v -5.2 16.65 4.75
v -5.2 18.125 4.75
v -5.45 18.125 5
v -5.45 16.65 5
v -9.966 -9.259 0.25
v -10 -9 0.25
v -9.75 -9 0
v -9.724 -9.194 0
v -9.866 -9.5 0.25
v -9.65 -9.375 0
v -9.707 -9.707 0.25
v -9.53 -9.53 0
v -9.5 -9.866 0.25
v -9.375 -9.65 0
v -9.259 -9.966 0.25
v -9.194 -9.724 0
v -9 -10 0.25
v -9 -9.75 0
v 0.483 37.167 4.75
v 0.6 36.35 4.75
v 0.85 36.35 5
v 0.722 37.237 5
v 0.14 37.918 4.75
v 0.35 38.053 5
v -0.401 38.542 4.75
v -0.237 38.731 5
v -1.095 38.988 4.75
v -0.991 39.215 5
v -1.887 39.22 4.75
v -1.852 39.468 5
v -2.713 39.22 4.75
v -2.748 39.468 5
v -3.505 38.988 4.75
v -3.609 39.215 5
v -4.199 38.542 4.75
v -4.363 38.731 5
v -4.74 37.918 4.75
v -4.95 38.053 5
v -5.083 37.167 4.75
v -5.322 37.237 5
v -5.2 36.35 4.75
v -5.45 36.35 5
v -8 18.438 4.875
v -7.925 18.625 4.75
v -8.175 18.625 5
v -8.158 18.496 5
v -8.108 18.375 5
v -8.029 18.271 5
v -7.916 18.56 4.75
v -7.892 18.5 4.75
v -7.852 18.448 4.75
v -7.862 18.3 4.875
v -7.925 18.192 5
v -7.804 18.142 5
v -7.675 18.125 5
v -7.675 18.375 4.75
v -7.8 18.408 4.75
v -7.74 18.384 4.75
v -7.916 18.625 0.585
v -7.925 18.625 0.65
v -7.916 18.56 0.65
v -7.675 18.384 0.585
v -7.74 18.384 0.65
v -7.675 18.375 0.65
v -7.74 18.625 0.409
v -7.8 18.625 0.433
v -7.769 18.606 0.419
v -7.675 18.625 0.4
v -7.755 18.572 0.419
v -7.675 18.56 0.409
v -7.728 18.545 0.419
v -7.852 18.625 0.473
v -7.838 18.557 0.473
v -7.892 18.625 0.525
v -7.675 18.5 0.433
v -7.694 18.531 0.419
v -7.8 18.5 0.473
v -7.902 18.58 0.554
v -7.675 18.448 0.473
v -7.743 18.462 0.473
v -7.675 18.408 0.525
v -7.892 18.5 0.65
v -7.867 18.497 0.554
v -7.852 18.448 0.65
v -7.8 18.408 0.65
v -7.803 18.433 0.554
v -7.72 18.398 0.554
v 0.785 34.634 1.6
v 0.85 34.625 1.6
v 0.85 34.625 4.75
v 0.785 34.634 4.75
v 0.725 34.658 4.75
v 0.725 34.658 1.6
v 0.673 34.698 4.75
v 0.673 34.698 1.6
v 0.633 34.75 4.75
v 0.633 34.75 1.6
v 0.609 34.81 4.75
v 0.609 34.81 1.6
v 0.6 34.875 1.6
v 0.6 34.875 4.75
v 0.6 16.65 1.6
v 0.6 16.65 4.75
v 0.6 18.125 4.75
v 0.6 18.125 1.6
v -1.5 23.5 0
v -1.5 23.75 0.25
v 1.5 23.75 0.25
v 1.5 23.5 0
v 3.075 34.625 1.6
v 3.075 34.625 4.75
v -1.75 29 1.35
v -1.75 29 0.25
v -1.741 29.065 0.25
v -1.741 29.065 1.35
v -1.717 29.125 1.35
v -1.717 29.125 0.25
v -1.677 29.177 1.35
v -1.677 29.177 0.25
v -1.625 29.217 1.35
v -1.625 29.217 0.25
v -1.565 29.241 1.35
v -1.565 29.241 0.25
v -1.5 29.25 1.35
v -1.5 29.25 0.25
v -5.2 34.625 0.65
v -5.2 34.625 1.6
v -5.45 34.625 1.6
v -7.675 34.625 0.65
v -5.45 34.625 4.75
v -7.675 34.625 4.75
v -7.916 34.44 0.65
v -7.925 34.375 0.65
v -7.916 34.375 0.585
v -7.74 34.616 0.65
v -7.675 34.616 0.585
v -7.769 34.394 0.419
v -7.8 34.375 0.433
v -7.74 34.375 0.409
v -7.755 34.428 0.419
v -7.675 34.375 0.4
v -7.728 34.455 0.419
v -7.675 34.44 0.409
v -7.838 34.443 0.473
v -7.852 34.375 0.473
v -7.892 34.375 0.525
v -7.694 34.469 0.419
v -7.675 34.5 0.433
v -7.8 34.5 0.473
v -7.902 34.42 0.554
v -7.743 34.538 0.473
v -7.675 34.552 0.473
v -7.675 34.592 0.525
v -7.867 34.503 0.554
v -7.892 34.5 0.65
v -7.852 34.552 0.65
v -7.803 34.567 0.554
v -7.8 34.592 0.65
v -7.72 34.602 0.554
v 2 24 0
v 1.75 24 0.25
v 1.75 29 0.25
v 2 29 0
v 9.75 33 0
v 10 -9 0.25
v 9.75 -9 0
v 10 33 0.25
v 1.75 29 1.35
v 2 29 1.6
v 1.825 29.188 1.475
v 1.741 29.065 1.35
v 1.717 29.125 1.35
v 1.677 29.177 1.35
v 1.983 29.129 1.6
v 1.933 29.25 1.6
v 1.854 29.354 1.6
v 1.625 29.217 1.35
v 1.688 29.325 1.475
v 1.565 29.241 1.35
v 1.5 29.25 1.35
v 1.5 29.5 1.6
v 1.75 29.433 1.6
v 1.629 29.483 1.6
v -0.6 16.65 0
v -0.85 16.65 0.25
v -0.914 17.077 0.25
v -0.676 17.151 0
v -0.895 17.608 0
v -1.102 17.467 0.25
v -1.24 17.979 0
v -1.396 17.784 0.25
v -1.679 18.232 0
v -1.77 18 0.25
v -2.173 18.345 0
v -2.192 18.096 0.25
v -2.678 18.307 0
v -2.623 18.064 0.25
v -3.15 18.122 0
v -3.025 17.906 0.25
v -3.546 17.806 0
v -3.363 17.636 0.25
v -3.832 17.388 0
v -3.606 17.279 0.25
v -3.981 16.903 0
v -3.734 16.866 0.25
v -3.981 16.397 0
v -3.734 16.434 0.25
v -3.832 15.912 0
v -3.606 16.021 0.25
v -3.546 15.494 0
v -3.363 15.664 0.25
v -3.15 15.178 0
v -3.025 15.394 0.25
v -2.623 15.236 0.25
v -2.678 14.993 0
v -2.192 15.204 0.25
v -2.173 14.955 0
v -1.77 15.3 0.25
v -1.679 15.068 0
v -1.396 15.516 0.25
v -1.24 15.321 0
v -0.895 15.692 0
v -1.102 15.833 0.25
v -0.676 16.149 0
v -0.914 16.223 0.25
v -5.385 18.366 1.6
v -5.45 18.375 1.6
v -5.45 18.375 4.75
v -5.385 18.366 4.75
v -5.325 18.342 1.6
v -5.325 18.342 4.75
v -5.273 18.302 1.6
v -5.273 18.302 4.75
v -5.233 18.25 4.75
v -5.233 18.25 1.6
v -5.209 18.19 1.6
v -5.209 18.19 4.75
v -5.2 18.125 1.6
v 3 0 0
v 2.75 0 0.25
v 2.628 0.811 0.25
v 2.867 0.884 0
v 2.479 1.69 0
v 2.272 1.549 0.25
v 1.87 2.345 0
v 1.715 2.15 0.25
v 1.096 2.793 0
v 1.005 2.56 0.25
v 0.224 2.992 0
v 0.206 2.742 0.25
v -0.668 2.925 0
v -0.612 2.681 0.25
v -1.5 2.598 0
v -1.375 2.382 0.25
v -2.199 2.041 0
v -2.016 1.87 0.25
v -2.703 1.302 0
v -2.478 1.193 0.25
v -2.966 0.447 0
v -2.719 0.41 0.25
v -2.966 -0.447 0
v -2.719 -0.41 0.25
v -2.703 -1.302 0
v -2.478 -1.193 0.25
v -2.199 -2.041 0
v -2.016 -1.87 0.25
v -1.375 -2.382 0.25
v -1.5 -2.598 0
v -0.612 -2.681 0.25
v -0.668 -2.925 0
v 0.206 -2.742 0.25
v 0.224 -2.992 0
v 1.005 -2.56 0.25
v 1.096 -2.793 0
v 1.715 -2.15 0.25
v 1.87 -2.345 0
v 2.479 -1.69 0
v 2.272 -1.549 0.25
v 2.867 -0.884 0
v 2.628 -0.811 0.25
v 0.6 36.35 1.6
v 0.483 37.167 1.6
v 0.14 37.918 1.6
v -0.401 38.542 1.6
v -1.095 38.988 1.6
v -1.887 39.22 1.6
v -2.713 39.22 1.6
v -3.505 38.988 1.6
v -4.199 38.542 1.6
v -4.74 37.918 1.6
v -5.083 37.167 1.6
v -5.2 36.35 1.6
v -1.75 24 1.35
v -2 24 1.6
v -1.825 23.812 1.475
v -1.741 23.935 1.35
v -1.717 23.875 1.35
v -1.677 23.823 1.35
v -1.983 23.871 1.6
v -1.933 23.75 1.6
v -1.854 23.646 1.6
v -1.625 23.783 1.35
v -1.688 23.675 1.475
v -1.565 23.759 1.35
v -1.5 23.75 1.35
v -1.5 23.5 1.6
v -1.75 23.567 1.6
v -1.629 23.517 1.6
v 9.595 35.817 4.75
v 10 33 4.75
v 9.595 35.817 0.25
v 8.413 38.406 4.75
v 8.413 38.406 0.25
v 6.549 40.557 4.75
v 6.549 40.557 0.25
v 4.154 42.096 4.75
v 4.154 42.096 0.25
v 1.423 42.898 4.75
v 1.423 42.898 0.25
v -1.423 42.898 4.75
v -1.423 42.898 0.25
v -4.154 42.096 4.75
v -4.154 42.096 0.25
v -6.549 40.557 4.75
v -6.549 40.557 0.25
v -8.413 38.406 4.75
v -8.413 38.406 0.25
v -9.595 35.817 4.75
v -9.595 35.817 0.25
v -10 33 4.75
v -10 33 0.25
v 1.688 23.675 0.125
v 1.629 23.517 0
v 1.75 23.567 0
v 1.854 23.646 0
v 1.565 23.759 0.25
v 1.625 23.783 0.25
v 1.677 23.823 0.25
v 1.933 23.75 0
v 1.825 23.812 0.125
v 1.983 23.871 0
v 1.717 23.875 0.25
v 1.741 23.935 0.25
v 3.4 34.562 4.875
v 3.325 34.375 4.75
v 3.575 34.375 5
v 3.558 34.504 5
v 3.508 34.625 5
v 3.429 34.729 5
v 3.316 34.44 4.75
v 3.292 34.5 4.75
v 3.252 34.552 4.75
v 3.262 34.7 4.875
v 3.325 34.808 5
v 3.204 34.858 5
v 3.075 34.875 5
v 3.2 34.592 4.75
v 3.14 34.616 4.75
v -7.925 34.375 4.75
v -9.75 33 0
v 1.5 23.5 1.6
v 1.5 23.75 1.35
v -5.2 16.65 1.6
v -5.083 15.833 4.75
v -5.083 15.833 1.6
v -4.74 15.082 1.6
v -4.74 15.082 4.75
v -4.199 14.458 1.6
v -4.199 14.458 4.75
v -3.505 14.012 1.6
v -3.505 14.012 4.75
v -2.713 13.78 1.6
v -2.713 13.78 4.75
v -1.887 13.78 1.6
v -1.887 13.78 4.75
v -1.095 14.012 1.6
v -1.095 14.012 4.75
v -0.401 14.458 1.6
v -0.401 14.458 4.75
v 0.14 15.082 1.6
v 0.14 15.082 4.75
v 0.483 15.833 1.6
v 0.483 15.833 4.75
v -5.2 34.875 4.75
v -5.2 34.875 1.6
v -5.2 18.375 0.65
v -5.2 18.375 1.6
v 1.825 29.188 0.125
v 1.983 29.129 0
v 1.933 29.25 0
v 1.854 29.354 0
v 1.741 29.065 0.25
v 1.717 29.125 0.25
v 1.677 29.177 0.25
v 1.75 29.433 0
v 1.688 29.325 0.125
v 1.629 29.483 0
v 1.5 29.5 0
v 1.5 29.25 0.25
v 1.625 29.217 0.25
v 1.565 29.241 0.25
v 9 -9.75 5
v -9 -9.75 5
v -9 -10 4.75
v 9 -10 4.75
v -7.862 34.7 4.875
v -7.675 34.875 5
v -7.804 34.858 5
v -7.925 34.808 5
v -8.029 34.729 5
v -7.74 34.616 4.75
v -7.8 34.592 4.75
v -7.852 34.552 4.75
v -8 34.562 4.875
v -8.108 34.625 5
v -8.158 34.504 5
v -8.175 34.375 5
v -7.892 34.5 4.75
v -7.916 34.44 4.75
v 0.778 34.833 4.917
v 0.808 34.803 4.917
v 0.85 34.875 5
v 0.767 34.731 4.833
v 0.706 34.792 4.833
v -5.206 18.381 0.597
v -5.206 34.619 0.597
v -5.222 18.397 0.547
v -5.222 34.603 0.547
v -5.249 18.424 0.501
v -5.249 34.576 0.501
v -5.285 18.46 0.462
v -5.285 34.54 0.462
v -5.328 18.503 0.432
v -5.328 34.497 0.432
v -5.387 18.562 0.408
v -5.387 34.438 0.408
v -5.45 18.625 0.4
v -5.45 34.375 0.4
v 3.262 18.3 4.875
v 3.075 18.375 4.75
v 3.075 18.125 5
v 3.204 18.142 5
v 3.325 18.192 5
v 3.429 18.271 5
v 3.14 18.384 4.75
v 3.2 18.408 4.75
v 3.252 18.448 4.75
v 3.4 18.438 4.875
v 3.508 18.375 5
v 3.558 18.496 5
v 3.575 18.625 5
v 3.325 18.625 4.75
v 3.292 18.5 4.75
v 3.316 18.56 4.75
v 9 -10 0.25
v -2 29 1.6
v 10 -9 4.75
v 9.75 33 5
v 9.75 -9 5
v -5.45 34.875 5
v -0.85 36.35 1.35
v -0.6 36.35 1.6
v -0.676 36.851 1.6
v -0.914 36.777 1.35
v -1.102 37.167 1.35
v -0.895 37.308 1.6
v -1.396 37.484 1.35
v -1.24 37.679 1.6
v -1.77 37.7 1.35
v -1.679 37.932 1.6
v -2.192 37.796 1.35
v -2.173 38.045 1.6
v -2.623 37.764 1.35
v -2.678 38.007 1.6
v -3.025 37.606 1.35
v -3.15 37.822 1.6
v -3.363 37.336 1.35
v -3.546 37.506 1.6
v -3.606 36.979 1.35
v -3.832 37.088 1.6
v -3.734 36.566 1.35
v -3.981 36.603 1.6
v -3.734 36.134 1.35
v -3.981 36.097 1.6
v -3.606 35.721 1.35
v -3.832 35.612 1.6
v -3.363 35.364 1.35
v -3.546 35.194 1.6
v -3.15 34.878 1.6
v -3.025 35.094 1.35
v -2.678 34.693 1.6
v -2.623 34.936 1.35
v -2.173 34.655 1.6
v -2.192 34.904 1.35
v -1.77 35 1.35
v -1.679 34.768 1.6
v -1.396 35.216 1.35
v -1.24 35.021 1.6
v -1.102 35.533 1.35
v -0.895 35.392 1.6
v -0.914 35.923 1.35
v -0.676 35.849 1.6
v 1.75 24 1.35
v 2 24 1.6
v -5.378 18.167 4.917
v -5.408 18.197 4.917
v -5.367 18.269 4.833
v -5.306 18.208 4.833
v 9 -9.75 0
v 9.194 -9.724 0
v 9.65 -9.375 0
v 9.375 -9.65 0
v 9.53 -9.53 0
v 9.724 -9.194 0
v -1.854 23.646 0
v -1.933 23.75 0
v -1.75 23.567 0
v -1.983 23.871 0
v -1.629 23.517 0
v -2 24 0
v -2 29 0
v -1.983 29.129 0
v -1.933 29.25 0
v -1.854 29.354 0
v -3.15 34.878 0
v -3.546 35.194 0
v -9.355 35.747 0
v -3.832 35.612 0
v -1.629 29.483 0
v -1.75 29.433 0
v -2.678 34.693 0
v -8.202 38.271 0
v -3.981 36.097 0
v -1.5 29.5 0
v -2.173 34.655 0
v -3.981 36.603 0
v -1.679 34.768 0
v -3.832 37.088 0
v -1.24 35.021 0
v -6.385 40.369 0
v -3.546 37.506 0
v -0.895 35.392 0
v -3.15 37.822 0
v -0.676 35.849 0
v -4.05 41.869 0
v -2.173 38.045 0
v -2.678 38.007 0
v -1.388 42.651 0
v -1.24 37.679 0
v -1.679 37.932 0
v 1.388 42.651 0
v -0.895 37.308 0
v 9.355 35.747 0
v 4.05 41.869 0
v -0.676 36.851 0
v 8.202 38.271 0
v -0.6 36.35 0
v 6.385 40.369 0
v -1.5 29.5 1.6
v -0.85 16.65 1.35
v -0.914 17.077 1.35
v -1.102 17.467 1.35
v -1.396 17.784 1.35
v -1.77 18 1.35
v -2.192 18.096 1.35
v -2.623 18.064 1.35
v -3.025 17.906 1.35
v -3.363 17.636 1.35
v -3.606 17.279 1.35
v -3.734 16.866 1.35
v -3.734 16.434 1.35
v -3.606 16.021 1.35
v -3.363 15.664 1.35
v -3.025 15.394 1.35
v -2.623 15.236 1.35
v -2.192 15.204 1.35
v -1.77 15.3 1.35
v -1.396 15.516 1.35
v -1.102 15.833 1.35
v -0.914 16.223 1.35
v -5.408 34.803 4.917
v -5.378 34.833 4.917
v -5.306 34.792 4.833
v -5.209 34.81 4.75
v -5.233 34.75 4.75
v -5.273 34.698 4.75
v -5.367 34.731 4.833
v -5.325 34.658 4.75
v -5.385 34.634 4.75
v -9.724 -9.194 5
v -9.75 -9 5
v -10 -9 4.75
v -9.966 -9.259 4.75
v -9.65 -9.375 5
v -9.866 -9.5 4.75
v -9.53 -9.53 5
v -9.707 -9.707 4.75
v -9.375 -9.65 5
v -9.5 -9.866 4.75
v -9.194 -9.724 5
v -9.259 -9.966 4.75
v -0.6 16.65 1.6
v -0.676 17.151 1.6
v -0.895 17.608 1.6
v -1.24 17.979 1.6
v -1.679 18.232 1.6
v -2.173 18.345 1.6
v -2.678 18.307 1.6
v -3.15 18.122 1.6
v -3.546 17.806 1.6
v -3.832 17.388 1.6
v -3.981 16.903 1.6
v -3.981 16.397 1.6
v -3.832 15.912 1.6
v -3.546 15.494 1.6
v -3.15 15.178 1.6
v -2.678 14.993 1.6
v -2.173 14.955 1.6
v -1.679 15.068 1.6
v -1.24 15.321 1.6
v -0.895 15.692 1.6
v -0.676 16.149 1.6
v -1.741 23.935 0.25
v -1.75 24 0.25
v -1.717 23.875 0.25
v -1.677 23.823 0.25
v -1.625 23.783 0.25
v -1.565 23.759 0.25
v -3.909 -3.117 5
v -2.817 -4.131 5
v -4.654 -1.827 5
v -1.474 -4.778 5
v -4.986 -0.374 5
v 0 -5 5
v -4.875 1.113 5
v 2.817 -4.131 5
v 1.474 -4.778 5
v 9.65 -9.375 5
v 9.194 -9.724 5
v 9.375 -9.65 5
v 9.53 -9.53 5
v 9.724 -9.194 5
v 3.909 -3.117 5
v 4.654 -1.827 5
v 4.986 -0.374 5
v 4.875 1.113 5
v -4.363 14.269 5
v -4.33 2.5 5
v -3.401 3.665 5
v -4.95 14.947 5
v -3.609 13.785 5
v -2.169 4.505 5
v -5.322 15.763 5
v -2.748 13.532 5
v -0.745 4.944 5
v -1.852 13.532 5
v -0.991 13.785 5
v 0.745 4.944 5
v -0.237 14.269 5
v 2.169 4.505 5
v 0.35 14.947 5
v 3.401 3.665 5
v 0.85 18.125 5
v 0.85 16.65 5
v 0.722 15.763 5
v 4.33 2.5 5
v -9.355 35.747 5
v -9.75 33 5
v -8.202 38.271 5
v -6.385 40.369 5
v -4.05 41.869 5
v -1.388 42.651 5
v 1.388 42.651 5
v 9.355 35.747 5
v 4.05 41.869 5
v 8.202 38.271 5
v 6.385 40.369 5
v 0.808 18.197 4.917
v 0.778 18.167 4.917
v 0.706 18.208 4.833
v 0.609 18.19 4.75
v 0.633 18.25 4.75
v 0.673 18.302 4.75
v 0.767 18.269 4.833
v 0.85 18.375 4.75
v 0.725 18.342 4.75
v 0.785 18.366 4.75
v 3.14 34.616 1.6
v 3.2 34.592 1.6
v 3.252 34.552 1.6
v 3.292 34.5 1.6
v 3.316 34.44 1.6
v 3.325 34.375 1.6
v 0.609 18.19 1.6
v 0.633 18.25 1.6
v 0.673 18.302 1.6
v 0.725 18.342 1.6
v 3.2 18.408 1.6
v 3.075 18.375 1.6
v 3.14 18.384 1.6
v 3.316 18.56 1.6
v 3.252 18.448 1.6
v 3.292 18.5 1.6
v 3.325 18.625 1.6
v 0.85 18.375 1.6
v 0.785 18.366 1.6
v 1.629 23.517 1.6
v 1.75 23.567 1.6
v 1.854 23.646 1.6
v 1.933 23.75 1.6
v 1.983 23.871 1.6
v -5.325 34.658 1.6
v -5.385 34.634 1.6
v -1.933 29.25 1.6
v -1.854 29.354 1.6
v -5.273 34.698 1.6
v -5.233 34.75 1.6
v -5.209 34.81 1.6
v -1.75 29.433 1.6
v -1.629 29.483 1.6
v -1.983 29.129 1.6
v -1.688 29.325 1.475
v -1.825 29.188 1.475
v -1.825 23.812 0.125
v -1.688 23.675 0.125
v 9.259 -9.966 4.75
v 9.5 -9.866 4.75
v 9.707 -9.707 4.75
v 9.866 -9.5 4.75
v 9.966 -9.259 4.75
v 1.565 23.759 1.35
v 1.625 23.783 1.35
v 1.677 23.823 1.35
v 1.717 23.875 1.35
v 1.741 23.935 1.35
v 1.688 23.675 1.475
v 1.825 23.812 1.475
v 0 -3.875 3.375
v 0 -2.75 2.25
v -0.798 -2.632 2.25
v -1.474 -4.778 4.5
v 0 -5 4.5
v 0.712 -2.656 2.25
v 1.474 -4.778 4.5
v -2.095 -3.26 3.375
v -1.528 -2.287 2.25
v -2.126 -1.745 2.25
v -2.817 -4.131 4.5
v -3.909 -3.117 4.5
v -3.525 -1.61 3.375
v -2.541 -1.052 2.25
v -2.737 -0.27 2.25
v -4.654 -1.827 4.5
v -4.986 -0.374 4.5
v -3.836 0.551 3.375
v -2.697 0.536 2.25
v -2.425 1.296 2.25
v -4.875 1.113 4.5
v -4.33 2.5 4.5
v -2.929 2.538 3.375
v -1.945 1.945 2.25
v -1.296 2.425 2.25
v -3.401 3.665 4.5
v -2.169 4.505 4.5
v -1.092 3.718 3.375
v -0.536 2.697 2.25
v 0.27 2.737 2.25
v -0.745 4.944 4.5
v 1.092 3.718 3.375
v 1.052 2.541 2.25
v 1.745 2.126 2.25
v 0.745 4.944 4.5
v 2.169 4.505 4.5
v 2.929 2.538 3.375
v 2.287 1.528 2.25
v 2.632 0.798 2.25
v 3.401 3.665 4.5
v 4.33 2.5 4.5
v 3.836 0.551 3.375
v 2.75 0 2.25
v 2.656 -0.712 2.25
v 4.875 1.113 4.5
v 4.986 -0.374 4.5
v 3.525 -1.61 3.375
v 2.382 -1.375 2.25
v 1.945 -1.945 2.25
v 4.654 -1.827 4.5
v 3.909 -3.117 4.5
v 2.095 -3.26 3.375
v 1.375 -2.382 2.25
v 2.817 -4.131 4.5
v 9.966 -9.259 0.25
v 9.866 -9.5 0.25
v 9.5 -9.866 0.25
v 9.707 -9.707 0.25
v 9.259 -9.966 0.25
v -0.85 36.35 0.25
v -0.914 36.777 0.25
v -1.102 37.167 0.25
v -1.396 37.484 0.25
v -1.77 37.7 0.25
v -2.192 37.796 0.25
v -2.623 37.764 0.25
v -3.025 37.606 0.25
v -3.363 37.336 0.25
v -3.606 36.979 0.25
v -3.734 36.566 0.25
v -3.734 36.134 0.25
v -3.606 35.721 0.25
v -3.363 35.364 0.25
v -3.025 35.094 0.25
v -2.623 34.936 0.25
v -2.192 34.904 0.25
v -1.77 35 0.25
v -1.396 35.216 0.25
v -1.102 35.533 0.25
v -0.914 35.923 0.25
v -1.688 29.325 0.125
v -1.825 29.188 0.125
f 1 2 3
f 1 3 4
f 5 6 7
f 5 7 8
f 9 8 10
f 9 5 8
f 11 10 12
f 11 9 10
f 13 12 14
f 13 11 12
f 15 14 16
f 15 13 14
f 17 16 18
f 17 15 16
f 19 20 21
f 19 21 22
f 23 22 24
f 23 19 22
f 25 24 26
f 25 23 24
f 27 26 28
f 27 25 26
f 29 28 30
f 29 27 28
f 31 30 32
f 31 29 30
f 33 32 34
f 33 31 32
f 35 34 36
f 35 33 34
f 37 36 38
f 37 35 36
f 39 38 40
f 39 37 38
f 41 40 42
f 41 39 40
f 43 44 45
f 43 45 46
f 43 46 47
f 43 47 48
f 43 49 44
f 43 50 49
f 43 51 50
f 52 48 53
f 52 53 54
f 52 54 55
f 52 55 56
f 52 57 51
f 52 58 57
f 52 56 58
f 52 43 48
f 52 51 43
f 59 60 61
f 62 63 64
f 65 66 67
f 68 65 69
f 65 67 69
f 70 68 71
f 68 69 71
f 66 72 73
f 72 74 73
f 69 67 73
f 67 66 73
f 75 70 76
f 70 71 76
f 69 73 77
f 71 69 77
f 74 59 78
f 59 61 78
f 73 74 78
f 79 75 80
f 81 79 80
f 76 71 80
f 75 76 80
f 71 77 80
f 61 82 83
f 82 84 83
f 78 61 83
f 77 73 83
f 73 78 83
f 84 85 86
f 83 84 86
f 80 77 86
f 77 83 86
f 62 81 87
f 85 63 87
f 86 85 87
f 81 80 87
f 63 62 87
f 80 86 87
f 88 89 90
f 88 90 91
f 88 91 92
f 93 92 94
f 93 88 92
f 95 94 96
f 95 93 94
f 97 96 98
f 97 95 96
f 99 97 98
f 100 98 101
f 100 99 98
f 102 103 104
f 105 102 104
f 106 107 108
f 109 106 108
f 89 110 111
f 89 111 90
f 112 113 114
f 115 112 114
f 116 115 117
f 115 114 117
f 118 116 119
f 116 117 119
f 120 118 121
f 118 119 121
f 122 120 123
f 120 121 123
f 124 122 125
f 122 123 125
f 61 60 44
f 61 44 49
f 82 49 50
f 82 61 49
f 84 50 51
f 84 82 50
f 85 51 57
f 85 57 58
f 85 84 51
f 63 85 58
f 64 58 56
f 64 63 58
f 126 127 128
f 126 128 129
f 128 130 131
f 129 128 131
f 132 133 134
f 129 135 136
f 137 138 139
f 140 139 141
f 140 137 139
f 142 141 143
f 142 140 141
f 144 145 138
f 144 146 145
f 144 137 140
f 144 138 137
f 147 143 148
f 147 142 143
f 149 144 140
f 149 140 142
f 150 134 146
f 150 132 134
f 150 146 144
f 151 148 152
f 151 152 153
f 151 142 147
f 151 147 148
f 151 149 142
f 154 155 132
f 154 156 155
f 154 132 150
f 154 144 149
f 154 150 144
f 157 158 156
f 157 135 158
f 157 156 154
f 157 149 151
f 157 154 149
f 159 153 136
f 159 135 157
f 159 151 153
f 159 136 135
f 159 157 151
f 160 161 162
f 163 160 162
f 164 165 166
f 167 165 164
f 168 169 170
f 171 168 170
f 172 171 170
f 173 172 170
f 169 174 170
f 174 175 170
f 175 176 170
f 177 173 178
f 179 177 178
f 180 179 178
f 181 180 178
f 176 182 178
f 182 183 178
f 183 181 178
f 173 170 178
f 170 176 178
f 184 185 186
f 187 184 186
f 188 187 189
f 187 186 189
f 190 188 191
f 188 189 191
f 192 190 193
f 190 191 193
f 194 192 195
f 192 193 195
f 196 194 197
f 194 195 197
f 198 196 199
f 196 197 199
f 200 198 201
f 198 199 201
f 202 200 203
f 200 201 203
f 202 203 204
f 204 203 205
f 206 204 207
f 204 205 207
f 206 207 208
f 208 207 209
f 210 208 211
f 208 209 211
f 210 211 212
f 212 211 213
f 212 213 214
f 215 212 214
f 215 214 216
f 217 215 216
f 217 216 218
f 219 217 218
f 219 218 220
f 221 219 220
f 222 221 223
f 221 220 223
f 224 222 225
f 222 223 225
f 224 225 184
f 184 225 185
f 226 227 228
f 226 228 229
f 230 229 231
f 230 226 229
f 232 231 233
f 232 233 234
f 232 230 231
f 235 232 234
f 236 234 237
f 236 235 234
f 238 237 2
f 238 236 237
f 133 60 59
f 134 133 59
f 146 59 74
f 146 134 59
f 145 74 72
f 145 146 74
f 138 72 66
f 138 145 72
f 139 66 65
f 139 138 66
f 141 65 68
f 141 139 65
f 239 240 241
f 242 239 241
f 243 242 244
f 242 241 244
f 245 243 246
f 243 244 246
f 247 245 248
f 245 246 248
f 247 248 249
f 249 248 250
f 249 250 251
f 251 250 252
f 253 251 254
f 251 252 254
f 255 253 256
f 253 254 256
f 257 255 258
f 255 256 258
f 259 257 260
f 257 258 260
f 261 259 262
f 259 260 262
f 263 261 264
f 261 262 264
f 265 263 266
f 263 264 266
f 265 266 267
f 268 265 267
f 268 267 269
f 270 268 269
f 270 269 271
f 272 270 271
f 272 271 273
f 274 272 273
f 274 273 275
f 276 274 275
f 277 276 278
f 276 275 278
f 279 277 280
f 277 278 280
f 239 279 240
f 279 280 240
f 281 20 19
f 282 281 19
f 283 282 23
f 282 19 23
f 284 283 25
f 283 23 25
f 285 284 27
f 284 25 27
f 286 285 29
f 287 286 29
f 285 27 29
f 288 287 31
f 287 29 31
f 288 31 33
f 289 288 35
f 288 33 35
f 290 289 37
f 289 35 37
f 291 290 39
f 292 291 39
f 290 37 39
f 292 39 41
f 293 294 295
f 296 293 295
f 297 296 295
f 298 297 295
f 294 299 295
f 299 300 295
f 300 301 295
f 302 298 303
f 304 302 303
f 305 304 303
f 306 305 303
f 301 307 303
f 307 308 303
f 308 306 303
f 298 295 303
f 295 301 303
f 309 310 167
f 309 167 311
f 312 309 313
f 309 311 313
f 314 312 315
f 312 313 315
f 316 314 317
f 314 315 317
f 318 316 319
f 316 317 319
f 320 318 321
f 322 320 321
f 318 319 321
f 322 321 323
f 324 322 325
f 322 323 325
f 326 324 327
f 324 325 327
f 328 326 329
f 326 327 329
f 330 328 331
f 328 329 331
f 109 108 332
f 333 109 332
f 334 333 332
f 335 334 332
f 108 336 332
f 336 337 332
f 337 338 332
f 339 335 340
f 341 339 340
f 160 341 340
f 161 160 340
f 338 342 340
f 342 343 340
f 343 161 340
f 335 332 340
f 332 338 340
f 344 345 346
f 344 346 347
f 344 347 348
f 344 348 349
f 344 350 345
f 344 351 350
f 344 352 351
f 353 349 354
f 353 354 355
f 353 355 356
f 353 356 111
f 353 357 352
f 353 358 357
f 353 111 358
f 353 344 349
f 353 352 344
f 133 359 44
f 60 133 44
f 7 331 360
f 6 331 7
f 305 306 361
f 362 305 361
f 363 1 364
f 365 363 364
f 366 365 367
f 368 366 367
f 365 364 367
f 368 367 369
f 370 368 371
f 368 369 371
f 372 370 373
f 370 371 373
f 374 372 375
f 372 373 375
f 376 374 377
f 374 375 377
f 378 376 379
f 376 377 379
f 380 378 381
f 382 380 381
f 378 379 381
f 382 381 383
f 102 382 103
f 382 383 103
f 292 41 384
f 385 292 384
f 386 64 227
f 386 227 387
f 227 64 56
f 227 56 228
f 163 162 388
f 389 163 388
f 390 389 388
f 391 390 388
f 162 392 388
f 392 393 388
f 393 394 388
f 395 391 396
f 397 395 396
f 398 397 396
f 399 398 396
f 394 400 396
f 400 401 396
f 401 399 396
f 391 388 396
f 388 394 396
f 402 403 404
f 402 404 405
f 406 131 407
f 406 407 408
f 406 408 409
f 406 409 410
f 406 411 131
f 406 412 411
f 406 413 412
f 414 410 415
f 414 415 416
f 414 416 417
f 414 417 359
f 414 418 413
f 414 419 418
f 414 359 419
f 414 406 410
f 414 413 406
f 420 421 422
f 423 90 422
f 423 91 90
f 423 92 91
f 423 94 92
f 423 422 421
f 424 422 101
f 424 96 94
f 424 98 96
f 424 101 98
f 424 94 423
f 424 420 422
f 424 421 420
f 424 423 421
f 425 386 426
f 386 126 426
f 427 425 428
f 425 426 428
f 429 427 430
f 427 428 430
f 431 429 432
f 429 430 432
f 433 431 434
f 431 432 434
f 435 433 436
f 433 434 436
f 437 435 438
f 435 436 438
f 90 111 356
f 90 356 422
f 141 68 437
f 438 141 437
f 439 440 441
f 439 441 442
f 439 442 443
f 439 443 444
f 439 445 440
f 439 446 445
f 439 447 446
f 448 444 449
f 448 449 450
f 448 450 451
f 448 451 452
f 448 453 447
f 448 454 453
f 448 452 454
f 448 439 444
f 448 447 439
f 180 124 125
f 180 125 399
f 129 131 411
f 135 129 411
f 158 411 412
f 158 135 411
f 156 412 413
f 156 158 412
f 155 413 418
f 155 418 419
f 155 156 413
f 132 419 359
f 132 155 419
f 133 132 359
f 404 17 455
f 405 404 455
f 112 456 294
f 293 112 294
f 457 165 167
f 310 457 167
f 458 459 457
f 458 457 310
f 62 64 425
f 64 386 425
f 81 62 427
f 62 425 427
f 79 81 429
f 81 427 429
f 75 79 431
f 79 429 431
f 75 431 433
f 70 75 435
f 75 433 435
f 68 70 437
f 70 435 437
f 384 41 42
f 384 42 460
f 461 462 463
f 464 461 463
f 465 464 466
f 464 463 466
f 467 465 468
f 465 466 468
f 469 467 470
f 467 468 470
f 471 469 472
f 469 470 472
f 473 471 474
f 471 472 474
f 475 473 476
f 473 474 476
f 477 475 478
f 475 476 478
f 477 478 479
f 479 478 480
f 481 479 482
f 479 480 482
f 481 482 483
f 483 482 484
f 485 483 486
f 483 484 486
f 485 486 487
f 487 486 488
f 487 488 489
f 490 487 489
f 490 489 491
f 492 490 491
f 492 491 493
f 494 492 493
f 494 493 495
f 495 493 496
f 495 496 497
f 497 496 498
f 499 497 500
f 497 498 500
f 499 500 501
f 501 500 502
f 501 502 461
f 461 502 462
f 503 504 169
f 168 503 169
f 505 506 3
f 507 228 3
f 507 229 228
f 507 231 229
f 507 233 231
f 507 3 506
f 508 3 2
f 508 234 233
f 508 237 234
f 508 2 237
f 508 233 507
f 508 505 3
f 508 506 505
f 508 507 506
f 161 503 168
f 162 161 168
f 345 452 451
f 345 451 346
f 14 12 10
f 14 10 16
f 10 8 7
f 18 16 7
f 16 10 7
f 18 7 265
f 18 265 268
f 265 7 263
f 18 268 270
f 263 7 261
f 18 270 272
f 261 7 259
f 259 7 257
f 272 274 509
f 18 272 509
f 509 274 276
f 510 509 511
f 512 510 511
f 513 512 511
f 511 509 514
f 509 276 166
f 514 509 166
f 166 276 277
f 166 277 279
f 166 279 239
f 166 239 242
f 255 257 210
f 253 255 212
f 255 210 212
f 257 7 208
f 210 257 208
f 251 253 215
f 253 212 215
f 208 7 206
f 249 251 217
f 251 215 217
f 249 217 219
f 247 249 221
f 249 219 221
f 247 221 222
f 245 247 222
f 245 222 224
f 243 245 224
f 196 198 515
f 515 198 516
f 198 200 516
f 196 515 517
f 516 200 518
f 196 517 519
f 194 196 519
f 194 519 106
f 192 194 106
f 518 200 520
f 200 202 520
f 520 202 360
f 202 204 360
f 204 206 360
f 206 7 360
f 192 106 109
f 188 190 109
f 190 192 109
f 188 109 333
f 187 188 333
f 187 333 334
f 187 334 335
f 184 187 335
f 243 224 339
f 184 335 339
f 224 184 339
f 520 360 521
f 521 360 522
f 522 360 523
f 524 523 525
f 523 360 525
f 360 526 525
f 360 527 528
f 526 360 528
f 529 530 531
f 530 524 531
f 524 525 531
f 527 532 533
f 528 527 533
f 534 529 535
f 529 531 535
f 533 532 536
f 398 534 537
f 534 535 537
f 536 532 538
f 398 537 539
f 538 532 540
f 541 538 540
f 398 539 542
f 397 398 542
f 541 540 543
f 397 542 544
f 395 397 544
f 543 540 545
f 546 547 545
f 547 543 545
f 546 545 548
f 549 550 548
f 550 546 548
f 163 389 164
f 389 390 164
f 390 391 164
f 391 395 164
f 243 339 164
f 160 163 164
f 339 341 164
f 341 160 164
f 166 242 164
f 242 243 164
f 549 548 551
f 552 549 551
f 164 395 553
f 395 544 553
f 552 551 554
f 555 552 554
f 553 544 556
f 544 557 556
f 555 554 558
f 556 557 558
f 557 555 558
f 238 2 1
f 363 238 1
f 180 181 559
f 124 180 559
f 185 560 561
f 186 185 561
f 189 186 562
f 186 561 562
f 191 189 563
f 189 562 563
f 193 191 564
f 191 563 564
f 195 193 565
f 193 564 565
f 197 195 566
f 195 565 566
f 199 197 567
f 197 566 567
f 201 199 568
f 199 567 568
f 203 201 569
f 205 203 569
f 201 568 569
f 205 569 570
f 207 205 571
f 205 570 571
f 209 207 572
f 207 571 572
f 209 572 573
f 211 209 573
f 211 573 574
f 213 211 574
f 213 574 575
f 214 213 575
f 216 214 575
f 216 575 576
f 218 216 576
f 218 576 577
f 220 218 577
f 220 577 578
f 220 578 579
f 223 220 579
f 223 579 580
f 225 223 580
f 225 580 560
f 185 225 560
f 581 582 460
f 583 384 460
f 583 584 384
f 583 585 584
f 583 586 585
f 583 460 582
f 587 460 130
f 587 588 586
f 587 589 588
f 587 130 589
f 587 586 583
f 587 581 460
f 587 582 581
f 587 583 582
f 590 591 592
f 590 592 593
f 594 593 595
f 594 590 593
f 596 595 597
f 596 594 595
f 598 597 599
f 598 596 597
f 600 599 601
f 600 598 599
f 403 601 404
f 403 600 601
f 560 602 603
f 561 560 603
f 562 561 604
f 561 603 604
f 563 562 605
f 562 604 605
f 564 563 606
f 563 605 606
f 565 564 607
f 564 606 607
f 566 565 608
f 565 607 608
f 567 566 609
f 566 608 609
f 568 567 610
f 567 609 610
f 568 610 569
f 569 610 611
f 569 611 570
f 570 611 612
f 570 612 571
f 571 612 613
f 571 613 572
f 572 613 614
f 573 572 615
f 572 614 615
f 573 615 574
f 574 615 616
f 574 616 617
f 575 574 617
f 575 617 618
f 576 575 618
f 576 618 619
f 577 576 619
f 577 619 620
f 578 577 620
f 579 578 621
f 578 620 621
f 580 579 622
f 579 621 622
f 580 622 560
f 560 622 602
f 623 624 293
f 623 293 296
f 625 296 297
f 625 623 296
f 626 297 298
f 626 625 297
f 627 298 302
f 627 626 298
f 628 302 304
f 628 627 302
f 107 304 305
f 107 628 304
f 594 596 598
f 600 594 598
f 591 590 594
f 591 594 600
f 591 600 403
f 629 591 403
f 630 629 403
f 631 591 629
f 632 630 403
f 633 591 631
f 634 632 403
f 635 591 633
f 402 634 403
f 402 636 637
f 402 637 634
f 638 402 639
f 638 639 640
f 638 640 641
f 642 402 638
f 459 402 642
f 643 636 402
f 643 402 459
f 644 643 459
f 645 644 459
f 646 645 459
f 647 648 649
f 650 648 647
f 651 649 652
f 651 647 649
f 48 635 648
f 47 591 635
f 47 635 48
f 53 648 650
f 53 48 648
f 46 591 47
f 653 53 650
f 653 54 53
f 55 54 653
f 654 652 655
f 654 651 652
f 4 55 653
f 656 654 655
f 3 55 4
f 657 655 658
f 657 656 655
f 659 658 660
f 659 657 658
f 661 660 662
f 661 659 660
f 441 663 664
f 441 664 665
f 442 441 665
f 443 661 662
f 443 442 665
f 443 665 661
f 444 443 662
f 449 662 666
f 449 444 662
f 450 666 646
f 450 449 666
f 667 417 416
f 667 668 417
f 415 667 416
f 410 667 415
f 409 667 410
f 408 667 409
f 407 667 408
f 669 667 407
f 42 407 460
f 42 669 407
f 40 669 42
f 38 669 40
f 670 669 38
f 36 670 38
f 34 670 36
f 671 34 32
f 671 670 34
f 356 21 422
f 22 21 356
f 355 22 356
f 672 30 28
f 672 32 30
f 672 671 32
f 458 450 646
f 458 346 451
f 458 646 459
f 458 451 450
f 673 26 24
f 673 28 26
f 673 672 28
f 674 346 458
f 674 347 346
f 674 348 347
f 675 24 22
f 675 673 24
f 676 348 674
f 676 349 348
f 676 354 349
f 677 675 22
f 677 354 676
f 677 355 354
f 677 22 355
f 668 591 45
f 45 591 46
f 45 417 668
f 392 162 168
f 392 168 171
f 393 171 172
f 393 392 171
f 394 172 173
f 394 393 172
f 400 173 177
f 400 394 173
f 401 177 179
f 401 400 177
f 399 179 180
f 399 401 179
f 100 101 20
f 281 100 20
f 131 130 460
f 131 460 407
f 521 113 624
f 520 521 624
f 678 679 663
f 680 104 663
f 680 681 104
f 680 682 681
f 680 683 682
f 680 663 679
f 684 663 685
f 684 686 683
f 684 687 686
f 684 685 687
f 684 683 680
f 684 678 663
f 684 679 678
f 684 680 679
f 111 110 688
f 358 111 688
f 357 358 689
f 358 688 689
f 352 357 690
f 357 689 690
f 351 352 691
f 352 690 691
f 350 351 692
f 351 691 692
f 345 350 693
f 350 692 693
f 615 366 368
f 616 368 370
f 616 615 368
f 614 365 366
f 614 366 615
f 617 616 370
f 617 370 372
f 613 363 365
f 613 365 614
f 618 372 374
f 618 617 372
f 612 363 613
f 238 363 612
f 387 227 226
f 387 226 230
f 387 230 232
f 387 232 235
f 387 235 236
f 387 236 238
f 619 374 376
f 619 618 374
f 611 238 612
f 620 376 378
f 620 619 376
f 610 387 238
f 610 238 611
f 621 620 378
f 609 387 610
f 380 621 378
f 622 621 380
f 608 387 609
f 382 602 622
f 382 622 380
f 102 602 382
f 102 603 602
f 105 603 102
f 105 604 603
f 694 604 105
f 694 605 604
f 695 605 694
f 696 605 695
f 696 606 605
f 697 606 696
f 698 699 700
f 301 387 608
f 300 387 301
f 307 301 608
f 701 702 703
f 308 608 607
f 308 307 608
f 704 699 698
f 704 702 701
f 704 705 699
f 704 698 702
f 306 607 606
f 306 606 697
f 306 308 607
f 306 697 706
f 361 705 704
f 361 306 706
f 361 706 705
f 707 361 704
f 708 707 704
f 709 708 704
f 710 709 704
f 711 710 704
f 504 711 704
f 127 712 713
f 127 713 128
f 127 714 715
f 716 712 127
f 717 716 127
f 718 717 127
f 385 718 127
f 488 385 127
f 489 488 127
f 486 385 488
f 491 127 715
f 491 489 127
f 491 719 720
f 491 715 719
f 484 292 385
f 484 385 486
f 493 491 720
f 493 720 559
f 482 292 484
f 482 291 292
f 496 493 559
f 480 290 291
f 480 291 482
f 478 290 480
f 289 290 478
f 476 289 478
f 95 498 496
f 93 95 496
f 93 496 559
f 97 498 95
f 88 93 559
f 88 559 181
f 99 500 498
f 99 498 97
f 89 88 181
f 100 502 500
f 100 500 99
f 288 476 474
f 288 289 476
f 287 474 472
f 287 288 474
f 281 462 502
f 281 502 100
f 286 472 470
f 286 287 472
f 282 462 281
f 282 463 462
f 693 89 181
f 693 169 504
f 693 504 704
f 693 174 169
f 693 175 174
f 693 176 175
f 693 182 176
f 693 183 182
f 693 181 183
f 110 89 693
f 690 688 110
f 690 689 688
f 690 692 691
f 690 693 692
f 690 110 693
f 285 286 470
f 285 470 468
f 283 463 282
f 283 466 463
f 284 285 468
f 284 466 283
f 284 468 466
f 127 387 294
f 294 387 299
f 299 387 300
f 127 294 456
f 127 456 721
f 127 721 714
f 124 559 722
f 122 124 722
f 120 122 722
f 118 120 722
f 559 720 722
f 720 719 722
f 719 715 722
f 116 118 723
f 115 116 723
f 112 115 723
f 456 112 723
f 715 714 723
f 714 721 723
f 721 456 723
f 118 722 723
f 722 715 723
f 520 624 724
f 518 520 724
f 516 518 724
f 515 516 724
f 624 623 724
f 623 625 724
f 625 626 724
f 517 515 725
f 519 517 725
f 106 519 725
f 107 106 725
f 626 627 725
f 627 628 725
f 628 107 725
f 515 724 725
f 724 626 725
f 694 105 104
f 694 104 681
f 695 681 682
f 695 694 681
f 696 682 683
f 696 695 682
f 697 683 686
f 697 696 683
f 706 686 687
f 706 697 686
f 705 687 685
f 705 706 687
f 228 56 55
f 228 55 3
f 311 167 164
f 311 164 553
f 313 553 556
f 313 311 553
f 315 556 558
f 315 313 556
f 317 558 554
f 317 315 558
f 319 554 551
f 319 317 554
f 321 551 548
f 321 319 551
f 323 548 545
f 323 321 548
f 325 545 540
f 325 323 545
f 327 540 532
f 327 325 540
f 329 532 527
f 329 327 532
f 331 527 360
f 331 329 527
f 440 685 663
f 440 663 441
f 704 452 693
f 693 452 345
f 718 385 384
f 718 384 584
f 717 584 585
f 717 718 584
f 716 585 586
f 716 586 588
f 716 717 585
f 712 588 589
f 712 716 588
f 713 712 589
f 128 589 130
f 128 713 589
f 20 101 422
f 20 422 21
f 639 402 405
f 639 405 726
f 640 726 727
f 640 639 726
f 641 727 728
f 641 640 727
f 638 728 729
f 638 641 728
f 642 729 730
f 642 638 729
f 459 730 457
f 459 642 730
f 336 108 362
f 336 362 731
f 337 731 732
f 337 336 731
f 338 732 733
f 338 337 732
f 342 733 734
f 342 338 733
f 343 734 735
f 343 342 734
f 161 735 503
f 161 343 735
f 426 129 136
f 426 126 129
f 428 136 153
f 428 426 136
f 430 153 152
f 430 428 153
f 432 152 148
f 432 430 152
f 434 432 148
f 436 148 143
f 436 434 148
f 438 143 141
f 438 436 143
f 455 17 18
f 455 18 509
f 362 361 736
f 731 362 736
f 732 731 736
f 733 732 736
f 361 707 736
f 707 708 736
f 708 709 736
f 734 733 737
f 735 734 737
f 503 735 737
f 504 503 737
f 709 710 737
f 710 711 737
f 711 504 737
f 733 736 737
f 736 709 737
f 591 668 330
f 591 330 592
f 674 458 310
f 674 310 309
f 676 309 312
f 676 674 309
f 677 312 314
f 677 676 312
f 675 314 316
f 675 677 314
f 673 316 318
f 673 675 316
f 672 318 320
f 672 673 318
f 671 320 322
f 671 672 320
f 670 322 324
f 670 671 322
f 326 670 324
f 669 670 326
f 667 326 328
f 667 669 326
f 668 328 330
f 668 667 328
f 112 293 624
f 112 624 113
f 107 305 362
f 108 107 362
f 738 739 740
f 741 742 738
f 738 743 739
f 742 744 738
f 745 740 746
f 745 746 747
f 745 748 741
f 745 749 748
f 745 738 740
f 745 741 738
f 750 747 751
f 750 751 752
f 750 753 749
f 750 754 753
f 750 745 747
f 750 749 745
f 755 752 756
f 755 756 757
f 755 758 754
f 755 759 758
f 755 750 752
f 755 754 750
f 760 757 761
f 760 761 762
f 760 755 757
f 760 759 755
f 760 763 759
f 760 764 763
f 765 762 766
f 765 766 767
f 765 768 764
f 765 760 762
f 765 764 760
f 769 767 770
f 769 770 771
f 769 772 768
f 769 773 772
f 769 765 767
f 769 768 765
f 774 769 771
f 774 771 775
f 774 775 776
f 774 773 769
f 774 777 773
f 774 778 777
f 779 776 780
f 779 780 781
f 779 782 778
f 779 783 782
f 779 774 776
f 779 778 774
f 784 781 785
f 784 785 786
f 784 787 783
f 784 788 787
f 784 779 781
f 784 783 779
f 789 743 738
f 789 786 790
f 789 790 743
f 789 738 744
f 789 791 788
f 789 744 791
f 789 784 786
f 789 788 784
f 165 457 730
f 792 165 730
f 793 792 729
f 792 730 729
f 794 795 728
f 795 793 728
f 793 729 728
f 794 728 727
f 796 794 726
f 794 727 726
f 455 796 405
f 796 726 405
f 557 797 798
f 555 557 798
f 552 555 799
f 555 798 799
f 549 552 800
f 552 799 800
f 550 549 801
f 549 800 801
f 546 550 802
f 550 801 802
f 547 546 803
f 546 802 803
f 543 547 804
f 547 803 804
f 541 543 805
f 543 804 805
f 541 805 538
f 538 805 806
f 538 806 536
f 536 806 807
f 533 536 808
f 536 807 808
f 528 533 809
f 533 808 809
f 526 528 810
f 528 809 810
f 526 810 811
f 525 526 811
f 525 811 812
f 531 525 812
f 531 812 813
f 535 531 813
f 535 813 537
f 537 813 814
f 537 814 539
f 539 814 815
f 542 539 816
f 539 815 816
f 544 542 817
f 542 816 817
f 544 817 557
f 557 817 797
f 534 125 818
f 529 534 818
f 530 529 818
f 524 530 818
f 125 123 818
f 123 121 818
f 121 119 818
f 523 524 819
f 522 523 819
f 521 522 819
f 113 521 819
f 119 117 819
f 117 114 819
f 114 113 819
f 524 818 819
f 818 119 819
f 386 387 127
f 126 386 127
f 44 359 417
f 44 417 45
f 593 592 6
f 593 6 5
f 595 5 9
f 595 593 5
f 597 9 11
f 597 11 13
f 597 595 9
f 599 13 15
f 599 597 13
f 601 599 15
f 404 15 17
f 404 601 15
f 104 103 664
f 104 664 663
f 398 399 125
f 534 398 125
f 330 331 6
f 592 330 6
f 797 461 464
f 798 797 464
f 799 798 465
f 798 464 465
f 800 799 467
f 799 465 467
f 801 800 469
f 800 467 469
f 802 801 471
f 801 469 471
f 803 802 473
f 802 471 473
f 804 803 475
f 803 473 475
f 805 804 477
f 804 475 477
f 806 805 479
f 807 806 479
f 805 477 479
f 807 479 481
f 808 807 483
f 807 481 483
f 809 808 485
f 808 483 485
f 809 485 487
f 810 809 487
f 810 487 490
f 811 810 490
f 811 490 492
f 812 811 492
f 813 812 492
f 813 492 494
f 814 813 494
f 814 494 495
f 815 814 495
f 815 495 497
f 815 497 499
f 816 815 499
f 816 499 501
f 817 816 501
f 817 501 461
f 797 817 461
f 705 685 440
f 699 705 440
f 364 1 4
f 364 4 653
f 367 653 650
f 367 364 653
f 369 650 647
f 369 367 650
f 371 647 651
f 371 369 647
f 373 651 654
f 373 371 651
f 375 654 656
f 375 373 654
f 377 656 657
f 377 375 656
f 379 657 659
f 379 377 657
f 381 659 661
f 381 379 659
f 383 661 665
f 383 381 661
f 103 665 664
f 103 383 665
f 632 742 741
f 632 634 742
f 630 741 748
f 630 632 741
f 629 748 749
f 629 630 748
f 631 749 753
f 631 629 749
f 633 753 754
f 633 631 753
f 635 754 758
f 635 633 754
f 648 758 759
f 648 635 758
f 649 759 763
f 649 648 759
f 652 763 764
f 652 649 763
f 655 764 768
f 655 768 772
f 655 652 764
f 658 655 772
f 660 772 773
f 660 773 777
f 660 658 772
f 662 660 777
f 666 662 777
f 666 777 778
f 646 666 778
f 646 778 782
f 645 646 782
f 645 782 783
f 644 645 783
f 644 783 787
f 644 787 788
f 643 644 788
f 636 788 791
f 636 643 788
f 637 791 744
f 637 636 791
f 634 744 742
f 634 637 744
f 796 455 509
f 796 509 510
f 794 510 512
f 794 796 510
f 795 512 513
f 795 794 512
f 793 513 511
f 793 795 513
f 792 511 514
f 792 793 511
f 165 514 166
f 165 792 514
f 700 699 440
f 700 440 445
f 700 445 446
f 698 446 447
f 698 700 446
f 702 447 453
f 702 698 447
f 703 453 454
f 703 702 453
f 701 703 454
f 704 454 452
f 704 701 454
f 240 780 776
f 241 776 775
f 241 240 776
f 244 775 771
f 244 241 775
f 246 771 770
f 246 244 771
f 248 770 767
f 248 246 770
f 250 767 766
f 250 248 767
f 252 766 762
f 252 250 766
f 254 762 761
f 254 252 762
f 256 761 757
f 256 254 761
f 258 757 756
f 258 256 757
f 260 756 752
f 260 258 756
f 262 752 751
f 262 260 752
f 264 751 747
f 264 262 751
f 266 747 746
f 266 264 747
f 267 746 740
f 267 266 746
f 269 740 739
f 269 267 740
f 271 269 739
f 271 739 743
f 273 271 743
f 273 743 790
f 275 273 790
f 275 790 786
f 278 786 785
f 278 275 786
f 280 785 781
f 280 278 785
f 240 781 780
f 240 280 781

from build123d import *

# Parameters (mm, degrees)
SKETCH1_R           = 2.75
BOSS_EXTRUDE1_DEPTH = 5
CUT_EXTRUDE1_REACH  = 46.43
SKETCH5_R           = 1.45
SKETCH6_R           = 1.45
CUT_EXTRUDE2_DEPTH  = 3.4
SKETCH7_W           = 2.725
SKETCH7_H           = 16.25
CUT_EXTRUDE3_DEPTH  = 1.2
CUT_EXTRUDE4_REACH  = 46.278
SKETCH8_W           = 3.5
SKETCH8_H           = 5.5
FILLET1_R           = 1
FILLET3_R           = 0.25
CHAMFER2_SIZE       = 0.25


with BuildPart() as part:
    # Sketch1 → Boss-Extrude1 (new body)
    with BuildSketch(Plane.XY):
        with BuildLine():
            ThreePointArc((10, 33), (0, 43), (-10, 33))
            Line((-10, 33), (-10, -10))
            Line((-10, -10), (10, -10))
            Line((10, -10), (10, 33))
        make_face()
        Circle(SKETCH1_R, mode=Mode.SUBTRACT)
    extrude(amount=BOSS_EXTRUDE1_DEPTH)

    # Sketch4 → CSK for M5 Flat Head Machine Screw1 (revolve, cut)
    with BuildSketch(Plane(origin=(0, 0, 5), x_dir=(0, -1, 0), z_dir=(1, 0, 0))):
        Polygon((0, 0), (0, 5), (2.75, 5), (2.75, 2.75), (5, 0.5), (5, 0), align=None)
    revolve(axis=Axis((0, 0, 11.35), (0, 0, -1)), mode=Mode.SUBTRACT)

    # Sketch5 → Cut-Extrude1 (cut, up to next)
    with BuildSketch(Plane.XY.offset(5), mode=Mode.PRIVATE) as cut_extrude1_sk1:
        with Locations((-2.3, 36.35)):
            Circle(SKETCH5_R)
    cut_extrude1_tool1 = extrude(cut_extrude1_sk1.sketch, amount=-CUT_EXTRUDE1_REACH, mode=Mode.PRIVATE) & part.part
    # Sketch5 → Cut-Extrude1 (cut, up to next)
    with BuildSketch(Plane.XY.offset(5), mode=Mode.PRIVATE) as cut_extrude1_sk2:
        with Locations((-2.3, 16.65)):
            Circle(SKETCH5_R)
    cut_extrude1_tool2 = extrude(cut_extrude1_sk2.sketch, amount=-CUT_EXTRUDE1_REACH, mode=Mode.PRIVATE) & part.part
    add(cut_extrude1_tool1.solids().sort_by_distance((-2.3, 36.35, 5))[0], mode=Mode.SUBTRACT)
    add(cut_extrude1_tool2.solids().sort_by_distance((-2.3, 16.65, 5))[0], mode=Mode.SUBTRACT)

    # Sketch6 → Cut-Extrude2 (cut)
    with BuildSketch(Plane.XY.offset(5)):
        with BuildLine():
            Line((3.325, 34.625), (0.6, 34.625))
            Line((0.6, 34.625), (0.6, 36.35))
            ThreePointArc((0.6, 36.35), (-2.3, 39.25), (-5.2, 36.35))
            Line((-5.2, 36.35), (-5.2, 34.625))
            Line((-5.2, 34.625), (-7.925, 34.625))
            Line((-7.925, 34.625), (-7.925, 18.375))
            Line((-7.925, 18.375), (-5.2, 18.375))
            Line((-5.2, 18.375), (-5.2, 16.65))
            ThreePointArc((-5.2, 16.65), (-2.3, 13.75), (0.6, 16.65))
            Line((0.6, 16.65), (0.6, 18.375))
            Line((0.6, 18.375), (3.325, 18.375))
            Line((3.325, 18.375), (3.325, 34.625))
        make_face()
        with Locations((-2.3, 36.35)):
            Circle(SKETCH6_R, mode=Mode.SUBTRACT)
        with Locations((-2.3, 16.65)):
            Circle(SKETCH6_R, mode=Mode.SUBTRACT)
    extrude(amount=-CUT_EXTRUDE2_DEPTH, mode=Mode.SUBTRACT)

    # Sketch7 → Cut-Extrude3 (cut)
    with BuildSketch(Plane.XY.offset(1.6)):
        with Locations((-6.5625, 26.5)):
            Rectangle(SKETCH7_W, SKETCH7_H)
    extrude(amount=-CUT_EXTRUDE3_DEPTH, mode=Mode.SUBTRACT)

    # Sketch8 → Cut-Extrude4 (cut, up to next)
    with BuildSketch(Plane.XY.offset(1.6), mode=Mode.PRIVATE) as cut_extrude4_sk1:
        with Locations((0, 26.5)):
            Rectangle(SKETCH8_W, SKETCH8_H)
    cut_extrude4_tool1 = extrude(cut_extrude4_sk1.sketch, amount=-CUT_EXTRUDE4_REACH, mode=Mode.PRIVATE) & part.part
    add(cut_extrude4_tool1.solids().sort_by_distance((0, 26.5, 1.6))[0], mode=Mode.SUBTRACT)

    # Fillet1
    fillet1_edges = [part.edges().sort_by_distance(p)[0] for p in [
        (10, -10, 2.5),
        (-10, -10, 2.5),
    ]]
    fillet(fillet1_edges, radius=FILLET1_R)

    # Fillet3
    fillet3_edges = [part.edges().sort_by_distance(p)[0] for p in [
        (1.75, 29.25, 0.8),
        (1.75, 23.75, 0.8),
        (-1.75, 23.75, 0.8),
        (-1.75, 29.25, 0.8),
        (0.6, 34.625, 3.3),
        (3.325, 34.625, 3.3),
        (3.325, 18.375, 3.3),
        (0.6, 18.375, 3.3),
        (-5.2, 18.375, 3.3),
        (-7.925, 18.375, 2.7),
        (-7.925, 34.625, 2.7),
        (-5.2, 34.625, 3.3),
        (-7.925, 26.5, 0.4),
        (-6.5625, 34.625, 0.4),
        (-5.2, 26.5, 0.4),
        (-6.5625, 18.375, 0.4),
    ]]
    fillet(fillet3_edges, radius=FILLET3_R)

    # Chamfer2
    chamfer2_edges = [part.edges().sort_by_distance(p)[0] for p in [
        (0, 43, 5),
        (0, -10, 0),
        (-9.707106781, -9.707106781, 0),
        (9.707106781, -9.707106781, 0),
        (0, -10, 5),
        (-9.707106781, -9.707106781, 5),
        (9.707106781, -9.707106781, 5),
        (-6.5625, 34.625, 5),
        (-6.5625, 18.375, 5),
        (-7.925, 26.5, 5),
        (1.9625, 34.625, 5),
        (3.325, 26.5, 5),
        (1.9625, 18.375, 5),
        (1.75, 26.5, 1.6),
        (0, 23.75, 1.6),
        (-1.75, 26.5, 1.6),
        (0, 29.25, 1.6),
        (-1.75, 26.5, 0),
        (0, 29.25, 0),
        (-10, 12, 5),
        (1.75, 26.5, 0),
        (0, 23.75, 0),
        (-7.851776695, 34.551776695, 5),
        (-7.851776695, 18.448223305, 5),
        (3.251776695, 18.448223305, 5),
        (3.251776695, 34.551776695, 5),
        (-1.676776695, 29.176776695, 1.6),
        (-1.676776695, 29.176776695, 0),
        (1.676776695, 29.176776695, 1.6),
        (1.676776695, 29.176776695, 0),
        (1.676776695, 23.823223305, 1.6),
        (1.676776695, 23.823223305, 0),
        (-1.676776695, 23.823223305, 1.6),
        (-1.676776695, 23.823223305, 0),
        (-3.75, 36.35, 0),
        (-3.75, 16.65, 0),
        (-5.2, 17.3875, 5),
        (-3.75, 36.35, 1.6),
        (0.6, 35.6125, 5),
        (-3.75, 16.65, 1.6),
        (-2.3, 39.25, 5),
        (-5.2, 35.6125, 5),
        (-2.3, 13.75, 5),
        (0.6, 17.3875, 5),
        (10, 12, 5),
        (-2.75, 0, 0),
        (-10, 12, 0),
        (0, 43, 0),
        (10, 12, 0),
    ]]
    chamfer(chamfer2_edges, length=CHAMFER2_SIZE)


solid = part.part
